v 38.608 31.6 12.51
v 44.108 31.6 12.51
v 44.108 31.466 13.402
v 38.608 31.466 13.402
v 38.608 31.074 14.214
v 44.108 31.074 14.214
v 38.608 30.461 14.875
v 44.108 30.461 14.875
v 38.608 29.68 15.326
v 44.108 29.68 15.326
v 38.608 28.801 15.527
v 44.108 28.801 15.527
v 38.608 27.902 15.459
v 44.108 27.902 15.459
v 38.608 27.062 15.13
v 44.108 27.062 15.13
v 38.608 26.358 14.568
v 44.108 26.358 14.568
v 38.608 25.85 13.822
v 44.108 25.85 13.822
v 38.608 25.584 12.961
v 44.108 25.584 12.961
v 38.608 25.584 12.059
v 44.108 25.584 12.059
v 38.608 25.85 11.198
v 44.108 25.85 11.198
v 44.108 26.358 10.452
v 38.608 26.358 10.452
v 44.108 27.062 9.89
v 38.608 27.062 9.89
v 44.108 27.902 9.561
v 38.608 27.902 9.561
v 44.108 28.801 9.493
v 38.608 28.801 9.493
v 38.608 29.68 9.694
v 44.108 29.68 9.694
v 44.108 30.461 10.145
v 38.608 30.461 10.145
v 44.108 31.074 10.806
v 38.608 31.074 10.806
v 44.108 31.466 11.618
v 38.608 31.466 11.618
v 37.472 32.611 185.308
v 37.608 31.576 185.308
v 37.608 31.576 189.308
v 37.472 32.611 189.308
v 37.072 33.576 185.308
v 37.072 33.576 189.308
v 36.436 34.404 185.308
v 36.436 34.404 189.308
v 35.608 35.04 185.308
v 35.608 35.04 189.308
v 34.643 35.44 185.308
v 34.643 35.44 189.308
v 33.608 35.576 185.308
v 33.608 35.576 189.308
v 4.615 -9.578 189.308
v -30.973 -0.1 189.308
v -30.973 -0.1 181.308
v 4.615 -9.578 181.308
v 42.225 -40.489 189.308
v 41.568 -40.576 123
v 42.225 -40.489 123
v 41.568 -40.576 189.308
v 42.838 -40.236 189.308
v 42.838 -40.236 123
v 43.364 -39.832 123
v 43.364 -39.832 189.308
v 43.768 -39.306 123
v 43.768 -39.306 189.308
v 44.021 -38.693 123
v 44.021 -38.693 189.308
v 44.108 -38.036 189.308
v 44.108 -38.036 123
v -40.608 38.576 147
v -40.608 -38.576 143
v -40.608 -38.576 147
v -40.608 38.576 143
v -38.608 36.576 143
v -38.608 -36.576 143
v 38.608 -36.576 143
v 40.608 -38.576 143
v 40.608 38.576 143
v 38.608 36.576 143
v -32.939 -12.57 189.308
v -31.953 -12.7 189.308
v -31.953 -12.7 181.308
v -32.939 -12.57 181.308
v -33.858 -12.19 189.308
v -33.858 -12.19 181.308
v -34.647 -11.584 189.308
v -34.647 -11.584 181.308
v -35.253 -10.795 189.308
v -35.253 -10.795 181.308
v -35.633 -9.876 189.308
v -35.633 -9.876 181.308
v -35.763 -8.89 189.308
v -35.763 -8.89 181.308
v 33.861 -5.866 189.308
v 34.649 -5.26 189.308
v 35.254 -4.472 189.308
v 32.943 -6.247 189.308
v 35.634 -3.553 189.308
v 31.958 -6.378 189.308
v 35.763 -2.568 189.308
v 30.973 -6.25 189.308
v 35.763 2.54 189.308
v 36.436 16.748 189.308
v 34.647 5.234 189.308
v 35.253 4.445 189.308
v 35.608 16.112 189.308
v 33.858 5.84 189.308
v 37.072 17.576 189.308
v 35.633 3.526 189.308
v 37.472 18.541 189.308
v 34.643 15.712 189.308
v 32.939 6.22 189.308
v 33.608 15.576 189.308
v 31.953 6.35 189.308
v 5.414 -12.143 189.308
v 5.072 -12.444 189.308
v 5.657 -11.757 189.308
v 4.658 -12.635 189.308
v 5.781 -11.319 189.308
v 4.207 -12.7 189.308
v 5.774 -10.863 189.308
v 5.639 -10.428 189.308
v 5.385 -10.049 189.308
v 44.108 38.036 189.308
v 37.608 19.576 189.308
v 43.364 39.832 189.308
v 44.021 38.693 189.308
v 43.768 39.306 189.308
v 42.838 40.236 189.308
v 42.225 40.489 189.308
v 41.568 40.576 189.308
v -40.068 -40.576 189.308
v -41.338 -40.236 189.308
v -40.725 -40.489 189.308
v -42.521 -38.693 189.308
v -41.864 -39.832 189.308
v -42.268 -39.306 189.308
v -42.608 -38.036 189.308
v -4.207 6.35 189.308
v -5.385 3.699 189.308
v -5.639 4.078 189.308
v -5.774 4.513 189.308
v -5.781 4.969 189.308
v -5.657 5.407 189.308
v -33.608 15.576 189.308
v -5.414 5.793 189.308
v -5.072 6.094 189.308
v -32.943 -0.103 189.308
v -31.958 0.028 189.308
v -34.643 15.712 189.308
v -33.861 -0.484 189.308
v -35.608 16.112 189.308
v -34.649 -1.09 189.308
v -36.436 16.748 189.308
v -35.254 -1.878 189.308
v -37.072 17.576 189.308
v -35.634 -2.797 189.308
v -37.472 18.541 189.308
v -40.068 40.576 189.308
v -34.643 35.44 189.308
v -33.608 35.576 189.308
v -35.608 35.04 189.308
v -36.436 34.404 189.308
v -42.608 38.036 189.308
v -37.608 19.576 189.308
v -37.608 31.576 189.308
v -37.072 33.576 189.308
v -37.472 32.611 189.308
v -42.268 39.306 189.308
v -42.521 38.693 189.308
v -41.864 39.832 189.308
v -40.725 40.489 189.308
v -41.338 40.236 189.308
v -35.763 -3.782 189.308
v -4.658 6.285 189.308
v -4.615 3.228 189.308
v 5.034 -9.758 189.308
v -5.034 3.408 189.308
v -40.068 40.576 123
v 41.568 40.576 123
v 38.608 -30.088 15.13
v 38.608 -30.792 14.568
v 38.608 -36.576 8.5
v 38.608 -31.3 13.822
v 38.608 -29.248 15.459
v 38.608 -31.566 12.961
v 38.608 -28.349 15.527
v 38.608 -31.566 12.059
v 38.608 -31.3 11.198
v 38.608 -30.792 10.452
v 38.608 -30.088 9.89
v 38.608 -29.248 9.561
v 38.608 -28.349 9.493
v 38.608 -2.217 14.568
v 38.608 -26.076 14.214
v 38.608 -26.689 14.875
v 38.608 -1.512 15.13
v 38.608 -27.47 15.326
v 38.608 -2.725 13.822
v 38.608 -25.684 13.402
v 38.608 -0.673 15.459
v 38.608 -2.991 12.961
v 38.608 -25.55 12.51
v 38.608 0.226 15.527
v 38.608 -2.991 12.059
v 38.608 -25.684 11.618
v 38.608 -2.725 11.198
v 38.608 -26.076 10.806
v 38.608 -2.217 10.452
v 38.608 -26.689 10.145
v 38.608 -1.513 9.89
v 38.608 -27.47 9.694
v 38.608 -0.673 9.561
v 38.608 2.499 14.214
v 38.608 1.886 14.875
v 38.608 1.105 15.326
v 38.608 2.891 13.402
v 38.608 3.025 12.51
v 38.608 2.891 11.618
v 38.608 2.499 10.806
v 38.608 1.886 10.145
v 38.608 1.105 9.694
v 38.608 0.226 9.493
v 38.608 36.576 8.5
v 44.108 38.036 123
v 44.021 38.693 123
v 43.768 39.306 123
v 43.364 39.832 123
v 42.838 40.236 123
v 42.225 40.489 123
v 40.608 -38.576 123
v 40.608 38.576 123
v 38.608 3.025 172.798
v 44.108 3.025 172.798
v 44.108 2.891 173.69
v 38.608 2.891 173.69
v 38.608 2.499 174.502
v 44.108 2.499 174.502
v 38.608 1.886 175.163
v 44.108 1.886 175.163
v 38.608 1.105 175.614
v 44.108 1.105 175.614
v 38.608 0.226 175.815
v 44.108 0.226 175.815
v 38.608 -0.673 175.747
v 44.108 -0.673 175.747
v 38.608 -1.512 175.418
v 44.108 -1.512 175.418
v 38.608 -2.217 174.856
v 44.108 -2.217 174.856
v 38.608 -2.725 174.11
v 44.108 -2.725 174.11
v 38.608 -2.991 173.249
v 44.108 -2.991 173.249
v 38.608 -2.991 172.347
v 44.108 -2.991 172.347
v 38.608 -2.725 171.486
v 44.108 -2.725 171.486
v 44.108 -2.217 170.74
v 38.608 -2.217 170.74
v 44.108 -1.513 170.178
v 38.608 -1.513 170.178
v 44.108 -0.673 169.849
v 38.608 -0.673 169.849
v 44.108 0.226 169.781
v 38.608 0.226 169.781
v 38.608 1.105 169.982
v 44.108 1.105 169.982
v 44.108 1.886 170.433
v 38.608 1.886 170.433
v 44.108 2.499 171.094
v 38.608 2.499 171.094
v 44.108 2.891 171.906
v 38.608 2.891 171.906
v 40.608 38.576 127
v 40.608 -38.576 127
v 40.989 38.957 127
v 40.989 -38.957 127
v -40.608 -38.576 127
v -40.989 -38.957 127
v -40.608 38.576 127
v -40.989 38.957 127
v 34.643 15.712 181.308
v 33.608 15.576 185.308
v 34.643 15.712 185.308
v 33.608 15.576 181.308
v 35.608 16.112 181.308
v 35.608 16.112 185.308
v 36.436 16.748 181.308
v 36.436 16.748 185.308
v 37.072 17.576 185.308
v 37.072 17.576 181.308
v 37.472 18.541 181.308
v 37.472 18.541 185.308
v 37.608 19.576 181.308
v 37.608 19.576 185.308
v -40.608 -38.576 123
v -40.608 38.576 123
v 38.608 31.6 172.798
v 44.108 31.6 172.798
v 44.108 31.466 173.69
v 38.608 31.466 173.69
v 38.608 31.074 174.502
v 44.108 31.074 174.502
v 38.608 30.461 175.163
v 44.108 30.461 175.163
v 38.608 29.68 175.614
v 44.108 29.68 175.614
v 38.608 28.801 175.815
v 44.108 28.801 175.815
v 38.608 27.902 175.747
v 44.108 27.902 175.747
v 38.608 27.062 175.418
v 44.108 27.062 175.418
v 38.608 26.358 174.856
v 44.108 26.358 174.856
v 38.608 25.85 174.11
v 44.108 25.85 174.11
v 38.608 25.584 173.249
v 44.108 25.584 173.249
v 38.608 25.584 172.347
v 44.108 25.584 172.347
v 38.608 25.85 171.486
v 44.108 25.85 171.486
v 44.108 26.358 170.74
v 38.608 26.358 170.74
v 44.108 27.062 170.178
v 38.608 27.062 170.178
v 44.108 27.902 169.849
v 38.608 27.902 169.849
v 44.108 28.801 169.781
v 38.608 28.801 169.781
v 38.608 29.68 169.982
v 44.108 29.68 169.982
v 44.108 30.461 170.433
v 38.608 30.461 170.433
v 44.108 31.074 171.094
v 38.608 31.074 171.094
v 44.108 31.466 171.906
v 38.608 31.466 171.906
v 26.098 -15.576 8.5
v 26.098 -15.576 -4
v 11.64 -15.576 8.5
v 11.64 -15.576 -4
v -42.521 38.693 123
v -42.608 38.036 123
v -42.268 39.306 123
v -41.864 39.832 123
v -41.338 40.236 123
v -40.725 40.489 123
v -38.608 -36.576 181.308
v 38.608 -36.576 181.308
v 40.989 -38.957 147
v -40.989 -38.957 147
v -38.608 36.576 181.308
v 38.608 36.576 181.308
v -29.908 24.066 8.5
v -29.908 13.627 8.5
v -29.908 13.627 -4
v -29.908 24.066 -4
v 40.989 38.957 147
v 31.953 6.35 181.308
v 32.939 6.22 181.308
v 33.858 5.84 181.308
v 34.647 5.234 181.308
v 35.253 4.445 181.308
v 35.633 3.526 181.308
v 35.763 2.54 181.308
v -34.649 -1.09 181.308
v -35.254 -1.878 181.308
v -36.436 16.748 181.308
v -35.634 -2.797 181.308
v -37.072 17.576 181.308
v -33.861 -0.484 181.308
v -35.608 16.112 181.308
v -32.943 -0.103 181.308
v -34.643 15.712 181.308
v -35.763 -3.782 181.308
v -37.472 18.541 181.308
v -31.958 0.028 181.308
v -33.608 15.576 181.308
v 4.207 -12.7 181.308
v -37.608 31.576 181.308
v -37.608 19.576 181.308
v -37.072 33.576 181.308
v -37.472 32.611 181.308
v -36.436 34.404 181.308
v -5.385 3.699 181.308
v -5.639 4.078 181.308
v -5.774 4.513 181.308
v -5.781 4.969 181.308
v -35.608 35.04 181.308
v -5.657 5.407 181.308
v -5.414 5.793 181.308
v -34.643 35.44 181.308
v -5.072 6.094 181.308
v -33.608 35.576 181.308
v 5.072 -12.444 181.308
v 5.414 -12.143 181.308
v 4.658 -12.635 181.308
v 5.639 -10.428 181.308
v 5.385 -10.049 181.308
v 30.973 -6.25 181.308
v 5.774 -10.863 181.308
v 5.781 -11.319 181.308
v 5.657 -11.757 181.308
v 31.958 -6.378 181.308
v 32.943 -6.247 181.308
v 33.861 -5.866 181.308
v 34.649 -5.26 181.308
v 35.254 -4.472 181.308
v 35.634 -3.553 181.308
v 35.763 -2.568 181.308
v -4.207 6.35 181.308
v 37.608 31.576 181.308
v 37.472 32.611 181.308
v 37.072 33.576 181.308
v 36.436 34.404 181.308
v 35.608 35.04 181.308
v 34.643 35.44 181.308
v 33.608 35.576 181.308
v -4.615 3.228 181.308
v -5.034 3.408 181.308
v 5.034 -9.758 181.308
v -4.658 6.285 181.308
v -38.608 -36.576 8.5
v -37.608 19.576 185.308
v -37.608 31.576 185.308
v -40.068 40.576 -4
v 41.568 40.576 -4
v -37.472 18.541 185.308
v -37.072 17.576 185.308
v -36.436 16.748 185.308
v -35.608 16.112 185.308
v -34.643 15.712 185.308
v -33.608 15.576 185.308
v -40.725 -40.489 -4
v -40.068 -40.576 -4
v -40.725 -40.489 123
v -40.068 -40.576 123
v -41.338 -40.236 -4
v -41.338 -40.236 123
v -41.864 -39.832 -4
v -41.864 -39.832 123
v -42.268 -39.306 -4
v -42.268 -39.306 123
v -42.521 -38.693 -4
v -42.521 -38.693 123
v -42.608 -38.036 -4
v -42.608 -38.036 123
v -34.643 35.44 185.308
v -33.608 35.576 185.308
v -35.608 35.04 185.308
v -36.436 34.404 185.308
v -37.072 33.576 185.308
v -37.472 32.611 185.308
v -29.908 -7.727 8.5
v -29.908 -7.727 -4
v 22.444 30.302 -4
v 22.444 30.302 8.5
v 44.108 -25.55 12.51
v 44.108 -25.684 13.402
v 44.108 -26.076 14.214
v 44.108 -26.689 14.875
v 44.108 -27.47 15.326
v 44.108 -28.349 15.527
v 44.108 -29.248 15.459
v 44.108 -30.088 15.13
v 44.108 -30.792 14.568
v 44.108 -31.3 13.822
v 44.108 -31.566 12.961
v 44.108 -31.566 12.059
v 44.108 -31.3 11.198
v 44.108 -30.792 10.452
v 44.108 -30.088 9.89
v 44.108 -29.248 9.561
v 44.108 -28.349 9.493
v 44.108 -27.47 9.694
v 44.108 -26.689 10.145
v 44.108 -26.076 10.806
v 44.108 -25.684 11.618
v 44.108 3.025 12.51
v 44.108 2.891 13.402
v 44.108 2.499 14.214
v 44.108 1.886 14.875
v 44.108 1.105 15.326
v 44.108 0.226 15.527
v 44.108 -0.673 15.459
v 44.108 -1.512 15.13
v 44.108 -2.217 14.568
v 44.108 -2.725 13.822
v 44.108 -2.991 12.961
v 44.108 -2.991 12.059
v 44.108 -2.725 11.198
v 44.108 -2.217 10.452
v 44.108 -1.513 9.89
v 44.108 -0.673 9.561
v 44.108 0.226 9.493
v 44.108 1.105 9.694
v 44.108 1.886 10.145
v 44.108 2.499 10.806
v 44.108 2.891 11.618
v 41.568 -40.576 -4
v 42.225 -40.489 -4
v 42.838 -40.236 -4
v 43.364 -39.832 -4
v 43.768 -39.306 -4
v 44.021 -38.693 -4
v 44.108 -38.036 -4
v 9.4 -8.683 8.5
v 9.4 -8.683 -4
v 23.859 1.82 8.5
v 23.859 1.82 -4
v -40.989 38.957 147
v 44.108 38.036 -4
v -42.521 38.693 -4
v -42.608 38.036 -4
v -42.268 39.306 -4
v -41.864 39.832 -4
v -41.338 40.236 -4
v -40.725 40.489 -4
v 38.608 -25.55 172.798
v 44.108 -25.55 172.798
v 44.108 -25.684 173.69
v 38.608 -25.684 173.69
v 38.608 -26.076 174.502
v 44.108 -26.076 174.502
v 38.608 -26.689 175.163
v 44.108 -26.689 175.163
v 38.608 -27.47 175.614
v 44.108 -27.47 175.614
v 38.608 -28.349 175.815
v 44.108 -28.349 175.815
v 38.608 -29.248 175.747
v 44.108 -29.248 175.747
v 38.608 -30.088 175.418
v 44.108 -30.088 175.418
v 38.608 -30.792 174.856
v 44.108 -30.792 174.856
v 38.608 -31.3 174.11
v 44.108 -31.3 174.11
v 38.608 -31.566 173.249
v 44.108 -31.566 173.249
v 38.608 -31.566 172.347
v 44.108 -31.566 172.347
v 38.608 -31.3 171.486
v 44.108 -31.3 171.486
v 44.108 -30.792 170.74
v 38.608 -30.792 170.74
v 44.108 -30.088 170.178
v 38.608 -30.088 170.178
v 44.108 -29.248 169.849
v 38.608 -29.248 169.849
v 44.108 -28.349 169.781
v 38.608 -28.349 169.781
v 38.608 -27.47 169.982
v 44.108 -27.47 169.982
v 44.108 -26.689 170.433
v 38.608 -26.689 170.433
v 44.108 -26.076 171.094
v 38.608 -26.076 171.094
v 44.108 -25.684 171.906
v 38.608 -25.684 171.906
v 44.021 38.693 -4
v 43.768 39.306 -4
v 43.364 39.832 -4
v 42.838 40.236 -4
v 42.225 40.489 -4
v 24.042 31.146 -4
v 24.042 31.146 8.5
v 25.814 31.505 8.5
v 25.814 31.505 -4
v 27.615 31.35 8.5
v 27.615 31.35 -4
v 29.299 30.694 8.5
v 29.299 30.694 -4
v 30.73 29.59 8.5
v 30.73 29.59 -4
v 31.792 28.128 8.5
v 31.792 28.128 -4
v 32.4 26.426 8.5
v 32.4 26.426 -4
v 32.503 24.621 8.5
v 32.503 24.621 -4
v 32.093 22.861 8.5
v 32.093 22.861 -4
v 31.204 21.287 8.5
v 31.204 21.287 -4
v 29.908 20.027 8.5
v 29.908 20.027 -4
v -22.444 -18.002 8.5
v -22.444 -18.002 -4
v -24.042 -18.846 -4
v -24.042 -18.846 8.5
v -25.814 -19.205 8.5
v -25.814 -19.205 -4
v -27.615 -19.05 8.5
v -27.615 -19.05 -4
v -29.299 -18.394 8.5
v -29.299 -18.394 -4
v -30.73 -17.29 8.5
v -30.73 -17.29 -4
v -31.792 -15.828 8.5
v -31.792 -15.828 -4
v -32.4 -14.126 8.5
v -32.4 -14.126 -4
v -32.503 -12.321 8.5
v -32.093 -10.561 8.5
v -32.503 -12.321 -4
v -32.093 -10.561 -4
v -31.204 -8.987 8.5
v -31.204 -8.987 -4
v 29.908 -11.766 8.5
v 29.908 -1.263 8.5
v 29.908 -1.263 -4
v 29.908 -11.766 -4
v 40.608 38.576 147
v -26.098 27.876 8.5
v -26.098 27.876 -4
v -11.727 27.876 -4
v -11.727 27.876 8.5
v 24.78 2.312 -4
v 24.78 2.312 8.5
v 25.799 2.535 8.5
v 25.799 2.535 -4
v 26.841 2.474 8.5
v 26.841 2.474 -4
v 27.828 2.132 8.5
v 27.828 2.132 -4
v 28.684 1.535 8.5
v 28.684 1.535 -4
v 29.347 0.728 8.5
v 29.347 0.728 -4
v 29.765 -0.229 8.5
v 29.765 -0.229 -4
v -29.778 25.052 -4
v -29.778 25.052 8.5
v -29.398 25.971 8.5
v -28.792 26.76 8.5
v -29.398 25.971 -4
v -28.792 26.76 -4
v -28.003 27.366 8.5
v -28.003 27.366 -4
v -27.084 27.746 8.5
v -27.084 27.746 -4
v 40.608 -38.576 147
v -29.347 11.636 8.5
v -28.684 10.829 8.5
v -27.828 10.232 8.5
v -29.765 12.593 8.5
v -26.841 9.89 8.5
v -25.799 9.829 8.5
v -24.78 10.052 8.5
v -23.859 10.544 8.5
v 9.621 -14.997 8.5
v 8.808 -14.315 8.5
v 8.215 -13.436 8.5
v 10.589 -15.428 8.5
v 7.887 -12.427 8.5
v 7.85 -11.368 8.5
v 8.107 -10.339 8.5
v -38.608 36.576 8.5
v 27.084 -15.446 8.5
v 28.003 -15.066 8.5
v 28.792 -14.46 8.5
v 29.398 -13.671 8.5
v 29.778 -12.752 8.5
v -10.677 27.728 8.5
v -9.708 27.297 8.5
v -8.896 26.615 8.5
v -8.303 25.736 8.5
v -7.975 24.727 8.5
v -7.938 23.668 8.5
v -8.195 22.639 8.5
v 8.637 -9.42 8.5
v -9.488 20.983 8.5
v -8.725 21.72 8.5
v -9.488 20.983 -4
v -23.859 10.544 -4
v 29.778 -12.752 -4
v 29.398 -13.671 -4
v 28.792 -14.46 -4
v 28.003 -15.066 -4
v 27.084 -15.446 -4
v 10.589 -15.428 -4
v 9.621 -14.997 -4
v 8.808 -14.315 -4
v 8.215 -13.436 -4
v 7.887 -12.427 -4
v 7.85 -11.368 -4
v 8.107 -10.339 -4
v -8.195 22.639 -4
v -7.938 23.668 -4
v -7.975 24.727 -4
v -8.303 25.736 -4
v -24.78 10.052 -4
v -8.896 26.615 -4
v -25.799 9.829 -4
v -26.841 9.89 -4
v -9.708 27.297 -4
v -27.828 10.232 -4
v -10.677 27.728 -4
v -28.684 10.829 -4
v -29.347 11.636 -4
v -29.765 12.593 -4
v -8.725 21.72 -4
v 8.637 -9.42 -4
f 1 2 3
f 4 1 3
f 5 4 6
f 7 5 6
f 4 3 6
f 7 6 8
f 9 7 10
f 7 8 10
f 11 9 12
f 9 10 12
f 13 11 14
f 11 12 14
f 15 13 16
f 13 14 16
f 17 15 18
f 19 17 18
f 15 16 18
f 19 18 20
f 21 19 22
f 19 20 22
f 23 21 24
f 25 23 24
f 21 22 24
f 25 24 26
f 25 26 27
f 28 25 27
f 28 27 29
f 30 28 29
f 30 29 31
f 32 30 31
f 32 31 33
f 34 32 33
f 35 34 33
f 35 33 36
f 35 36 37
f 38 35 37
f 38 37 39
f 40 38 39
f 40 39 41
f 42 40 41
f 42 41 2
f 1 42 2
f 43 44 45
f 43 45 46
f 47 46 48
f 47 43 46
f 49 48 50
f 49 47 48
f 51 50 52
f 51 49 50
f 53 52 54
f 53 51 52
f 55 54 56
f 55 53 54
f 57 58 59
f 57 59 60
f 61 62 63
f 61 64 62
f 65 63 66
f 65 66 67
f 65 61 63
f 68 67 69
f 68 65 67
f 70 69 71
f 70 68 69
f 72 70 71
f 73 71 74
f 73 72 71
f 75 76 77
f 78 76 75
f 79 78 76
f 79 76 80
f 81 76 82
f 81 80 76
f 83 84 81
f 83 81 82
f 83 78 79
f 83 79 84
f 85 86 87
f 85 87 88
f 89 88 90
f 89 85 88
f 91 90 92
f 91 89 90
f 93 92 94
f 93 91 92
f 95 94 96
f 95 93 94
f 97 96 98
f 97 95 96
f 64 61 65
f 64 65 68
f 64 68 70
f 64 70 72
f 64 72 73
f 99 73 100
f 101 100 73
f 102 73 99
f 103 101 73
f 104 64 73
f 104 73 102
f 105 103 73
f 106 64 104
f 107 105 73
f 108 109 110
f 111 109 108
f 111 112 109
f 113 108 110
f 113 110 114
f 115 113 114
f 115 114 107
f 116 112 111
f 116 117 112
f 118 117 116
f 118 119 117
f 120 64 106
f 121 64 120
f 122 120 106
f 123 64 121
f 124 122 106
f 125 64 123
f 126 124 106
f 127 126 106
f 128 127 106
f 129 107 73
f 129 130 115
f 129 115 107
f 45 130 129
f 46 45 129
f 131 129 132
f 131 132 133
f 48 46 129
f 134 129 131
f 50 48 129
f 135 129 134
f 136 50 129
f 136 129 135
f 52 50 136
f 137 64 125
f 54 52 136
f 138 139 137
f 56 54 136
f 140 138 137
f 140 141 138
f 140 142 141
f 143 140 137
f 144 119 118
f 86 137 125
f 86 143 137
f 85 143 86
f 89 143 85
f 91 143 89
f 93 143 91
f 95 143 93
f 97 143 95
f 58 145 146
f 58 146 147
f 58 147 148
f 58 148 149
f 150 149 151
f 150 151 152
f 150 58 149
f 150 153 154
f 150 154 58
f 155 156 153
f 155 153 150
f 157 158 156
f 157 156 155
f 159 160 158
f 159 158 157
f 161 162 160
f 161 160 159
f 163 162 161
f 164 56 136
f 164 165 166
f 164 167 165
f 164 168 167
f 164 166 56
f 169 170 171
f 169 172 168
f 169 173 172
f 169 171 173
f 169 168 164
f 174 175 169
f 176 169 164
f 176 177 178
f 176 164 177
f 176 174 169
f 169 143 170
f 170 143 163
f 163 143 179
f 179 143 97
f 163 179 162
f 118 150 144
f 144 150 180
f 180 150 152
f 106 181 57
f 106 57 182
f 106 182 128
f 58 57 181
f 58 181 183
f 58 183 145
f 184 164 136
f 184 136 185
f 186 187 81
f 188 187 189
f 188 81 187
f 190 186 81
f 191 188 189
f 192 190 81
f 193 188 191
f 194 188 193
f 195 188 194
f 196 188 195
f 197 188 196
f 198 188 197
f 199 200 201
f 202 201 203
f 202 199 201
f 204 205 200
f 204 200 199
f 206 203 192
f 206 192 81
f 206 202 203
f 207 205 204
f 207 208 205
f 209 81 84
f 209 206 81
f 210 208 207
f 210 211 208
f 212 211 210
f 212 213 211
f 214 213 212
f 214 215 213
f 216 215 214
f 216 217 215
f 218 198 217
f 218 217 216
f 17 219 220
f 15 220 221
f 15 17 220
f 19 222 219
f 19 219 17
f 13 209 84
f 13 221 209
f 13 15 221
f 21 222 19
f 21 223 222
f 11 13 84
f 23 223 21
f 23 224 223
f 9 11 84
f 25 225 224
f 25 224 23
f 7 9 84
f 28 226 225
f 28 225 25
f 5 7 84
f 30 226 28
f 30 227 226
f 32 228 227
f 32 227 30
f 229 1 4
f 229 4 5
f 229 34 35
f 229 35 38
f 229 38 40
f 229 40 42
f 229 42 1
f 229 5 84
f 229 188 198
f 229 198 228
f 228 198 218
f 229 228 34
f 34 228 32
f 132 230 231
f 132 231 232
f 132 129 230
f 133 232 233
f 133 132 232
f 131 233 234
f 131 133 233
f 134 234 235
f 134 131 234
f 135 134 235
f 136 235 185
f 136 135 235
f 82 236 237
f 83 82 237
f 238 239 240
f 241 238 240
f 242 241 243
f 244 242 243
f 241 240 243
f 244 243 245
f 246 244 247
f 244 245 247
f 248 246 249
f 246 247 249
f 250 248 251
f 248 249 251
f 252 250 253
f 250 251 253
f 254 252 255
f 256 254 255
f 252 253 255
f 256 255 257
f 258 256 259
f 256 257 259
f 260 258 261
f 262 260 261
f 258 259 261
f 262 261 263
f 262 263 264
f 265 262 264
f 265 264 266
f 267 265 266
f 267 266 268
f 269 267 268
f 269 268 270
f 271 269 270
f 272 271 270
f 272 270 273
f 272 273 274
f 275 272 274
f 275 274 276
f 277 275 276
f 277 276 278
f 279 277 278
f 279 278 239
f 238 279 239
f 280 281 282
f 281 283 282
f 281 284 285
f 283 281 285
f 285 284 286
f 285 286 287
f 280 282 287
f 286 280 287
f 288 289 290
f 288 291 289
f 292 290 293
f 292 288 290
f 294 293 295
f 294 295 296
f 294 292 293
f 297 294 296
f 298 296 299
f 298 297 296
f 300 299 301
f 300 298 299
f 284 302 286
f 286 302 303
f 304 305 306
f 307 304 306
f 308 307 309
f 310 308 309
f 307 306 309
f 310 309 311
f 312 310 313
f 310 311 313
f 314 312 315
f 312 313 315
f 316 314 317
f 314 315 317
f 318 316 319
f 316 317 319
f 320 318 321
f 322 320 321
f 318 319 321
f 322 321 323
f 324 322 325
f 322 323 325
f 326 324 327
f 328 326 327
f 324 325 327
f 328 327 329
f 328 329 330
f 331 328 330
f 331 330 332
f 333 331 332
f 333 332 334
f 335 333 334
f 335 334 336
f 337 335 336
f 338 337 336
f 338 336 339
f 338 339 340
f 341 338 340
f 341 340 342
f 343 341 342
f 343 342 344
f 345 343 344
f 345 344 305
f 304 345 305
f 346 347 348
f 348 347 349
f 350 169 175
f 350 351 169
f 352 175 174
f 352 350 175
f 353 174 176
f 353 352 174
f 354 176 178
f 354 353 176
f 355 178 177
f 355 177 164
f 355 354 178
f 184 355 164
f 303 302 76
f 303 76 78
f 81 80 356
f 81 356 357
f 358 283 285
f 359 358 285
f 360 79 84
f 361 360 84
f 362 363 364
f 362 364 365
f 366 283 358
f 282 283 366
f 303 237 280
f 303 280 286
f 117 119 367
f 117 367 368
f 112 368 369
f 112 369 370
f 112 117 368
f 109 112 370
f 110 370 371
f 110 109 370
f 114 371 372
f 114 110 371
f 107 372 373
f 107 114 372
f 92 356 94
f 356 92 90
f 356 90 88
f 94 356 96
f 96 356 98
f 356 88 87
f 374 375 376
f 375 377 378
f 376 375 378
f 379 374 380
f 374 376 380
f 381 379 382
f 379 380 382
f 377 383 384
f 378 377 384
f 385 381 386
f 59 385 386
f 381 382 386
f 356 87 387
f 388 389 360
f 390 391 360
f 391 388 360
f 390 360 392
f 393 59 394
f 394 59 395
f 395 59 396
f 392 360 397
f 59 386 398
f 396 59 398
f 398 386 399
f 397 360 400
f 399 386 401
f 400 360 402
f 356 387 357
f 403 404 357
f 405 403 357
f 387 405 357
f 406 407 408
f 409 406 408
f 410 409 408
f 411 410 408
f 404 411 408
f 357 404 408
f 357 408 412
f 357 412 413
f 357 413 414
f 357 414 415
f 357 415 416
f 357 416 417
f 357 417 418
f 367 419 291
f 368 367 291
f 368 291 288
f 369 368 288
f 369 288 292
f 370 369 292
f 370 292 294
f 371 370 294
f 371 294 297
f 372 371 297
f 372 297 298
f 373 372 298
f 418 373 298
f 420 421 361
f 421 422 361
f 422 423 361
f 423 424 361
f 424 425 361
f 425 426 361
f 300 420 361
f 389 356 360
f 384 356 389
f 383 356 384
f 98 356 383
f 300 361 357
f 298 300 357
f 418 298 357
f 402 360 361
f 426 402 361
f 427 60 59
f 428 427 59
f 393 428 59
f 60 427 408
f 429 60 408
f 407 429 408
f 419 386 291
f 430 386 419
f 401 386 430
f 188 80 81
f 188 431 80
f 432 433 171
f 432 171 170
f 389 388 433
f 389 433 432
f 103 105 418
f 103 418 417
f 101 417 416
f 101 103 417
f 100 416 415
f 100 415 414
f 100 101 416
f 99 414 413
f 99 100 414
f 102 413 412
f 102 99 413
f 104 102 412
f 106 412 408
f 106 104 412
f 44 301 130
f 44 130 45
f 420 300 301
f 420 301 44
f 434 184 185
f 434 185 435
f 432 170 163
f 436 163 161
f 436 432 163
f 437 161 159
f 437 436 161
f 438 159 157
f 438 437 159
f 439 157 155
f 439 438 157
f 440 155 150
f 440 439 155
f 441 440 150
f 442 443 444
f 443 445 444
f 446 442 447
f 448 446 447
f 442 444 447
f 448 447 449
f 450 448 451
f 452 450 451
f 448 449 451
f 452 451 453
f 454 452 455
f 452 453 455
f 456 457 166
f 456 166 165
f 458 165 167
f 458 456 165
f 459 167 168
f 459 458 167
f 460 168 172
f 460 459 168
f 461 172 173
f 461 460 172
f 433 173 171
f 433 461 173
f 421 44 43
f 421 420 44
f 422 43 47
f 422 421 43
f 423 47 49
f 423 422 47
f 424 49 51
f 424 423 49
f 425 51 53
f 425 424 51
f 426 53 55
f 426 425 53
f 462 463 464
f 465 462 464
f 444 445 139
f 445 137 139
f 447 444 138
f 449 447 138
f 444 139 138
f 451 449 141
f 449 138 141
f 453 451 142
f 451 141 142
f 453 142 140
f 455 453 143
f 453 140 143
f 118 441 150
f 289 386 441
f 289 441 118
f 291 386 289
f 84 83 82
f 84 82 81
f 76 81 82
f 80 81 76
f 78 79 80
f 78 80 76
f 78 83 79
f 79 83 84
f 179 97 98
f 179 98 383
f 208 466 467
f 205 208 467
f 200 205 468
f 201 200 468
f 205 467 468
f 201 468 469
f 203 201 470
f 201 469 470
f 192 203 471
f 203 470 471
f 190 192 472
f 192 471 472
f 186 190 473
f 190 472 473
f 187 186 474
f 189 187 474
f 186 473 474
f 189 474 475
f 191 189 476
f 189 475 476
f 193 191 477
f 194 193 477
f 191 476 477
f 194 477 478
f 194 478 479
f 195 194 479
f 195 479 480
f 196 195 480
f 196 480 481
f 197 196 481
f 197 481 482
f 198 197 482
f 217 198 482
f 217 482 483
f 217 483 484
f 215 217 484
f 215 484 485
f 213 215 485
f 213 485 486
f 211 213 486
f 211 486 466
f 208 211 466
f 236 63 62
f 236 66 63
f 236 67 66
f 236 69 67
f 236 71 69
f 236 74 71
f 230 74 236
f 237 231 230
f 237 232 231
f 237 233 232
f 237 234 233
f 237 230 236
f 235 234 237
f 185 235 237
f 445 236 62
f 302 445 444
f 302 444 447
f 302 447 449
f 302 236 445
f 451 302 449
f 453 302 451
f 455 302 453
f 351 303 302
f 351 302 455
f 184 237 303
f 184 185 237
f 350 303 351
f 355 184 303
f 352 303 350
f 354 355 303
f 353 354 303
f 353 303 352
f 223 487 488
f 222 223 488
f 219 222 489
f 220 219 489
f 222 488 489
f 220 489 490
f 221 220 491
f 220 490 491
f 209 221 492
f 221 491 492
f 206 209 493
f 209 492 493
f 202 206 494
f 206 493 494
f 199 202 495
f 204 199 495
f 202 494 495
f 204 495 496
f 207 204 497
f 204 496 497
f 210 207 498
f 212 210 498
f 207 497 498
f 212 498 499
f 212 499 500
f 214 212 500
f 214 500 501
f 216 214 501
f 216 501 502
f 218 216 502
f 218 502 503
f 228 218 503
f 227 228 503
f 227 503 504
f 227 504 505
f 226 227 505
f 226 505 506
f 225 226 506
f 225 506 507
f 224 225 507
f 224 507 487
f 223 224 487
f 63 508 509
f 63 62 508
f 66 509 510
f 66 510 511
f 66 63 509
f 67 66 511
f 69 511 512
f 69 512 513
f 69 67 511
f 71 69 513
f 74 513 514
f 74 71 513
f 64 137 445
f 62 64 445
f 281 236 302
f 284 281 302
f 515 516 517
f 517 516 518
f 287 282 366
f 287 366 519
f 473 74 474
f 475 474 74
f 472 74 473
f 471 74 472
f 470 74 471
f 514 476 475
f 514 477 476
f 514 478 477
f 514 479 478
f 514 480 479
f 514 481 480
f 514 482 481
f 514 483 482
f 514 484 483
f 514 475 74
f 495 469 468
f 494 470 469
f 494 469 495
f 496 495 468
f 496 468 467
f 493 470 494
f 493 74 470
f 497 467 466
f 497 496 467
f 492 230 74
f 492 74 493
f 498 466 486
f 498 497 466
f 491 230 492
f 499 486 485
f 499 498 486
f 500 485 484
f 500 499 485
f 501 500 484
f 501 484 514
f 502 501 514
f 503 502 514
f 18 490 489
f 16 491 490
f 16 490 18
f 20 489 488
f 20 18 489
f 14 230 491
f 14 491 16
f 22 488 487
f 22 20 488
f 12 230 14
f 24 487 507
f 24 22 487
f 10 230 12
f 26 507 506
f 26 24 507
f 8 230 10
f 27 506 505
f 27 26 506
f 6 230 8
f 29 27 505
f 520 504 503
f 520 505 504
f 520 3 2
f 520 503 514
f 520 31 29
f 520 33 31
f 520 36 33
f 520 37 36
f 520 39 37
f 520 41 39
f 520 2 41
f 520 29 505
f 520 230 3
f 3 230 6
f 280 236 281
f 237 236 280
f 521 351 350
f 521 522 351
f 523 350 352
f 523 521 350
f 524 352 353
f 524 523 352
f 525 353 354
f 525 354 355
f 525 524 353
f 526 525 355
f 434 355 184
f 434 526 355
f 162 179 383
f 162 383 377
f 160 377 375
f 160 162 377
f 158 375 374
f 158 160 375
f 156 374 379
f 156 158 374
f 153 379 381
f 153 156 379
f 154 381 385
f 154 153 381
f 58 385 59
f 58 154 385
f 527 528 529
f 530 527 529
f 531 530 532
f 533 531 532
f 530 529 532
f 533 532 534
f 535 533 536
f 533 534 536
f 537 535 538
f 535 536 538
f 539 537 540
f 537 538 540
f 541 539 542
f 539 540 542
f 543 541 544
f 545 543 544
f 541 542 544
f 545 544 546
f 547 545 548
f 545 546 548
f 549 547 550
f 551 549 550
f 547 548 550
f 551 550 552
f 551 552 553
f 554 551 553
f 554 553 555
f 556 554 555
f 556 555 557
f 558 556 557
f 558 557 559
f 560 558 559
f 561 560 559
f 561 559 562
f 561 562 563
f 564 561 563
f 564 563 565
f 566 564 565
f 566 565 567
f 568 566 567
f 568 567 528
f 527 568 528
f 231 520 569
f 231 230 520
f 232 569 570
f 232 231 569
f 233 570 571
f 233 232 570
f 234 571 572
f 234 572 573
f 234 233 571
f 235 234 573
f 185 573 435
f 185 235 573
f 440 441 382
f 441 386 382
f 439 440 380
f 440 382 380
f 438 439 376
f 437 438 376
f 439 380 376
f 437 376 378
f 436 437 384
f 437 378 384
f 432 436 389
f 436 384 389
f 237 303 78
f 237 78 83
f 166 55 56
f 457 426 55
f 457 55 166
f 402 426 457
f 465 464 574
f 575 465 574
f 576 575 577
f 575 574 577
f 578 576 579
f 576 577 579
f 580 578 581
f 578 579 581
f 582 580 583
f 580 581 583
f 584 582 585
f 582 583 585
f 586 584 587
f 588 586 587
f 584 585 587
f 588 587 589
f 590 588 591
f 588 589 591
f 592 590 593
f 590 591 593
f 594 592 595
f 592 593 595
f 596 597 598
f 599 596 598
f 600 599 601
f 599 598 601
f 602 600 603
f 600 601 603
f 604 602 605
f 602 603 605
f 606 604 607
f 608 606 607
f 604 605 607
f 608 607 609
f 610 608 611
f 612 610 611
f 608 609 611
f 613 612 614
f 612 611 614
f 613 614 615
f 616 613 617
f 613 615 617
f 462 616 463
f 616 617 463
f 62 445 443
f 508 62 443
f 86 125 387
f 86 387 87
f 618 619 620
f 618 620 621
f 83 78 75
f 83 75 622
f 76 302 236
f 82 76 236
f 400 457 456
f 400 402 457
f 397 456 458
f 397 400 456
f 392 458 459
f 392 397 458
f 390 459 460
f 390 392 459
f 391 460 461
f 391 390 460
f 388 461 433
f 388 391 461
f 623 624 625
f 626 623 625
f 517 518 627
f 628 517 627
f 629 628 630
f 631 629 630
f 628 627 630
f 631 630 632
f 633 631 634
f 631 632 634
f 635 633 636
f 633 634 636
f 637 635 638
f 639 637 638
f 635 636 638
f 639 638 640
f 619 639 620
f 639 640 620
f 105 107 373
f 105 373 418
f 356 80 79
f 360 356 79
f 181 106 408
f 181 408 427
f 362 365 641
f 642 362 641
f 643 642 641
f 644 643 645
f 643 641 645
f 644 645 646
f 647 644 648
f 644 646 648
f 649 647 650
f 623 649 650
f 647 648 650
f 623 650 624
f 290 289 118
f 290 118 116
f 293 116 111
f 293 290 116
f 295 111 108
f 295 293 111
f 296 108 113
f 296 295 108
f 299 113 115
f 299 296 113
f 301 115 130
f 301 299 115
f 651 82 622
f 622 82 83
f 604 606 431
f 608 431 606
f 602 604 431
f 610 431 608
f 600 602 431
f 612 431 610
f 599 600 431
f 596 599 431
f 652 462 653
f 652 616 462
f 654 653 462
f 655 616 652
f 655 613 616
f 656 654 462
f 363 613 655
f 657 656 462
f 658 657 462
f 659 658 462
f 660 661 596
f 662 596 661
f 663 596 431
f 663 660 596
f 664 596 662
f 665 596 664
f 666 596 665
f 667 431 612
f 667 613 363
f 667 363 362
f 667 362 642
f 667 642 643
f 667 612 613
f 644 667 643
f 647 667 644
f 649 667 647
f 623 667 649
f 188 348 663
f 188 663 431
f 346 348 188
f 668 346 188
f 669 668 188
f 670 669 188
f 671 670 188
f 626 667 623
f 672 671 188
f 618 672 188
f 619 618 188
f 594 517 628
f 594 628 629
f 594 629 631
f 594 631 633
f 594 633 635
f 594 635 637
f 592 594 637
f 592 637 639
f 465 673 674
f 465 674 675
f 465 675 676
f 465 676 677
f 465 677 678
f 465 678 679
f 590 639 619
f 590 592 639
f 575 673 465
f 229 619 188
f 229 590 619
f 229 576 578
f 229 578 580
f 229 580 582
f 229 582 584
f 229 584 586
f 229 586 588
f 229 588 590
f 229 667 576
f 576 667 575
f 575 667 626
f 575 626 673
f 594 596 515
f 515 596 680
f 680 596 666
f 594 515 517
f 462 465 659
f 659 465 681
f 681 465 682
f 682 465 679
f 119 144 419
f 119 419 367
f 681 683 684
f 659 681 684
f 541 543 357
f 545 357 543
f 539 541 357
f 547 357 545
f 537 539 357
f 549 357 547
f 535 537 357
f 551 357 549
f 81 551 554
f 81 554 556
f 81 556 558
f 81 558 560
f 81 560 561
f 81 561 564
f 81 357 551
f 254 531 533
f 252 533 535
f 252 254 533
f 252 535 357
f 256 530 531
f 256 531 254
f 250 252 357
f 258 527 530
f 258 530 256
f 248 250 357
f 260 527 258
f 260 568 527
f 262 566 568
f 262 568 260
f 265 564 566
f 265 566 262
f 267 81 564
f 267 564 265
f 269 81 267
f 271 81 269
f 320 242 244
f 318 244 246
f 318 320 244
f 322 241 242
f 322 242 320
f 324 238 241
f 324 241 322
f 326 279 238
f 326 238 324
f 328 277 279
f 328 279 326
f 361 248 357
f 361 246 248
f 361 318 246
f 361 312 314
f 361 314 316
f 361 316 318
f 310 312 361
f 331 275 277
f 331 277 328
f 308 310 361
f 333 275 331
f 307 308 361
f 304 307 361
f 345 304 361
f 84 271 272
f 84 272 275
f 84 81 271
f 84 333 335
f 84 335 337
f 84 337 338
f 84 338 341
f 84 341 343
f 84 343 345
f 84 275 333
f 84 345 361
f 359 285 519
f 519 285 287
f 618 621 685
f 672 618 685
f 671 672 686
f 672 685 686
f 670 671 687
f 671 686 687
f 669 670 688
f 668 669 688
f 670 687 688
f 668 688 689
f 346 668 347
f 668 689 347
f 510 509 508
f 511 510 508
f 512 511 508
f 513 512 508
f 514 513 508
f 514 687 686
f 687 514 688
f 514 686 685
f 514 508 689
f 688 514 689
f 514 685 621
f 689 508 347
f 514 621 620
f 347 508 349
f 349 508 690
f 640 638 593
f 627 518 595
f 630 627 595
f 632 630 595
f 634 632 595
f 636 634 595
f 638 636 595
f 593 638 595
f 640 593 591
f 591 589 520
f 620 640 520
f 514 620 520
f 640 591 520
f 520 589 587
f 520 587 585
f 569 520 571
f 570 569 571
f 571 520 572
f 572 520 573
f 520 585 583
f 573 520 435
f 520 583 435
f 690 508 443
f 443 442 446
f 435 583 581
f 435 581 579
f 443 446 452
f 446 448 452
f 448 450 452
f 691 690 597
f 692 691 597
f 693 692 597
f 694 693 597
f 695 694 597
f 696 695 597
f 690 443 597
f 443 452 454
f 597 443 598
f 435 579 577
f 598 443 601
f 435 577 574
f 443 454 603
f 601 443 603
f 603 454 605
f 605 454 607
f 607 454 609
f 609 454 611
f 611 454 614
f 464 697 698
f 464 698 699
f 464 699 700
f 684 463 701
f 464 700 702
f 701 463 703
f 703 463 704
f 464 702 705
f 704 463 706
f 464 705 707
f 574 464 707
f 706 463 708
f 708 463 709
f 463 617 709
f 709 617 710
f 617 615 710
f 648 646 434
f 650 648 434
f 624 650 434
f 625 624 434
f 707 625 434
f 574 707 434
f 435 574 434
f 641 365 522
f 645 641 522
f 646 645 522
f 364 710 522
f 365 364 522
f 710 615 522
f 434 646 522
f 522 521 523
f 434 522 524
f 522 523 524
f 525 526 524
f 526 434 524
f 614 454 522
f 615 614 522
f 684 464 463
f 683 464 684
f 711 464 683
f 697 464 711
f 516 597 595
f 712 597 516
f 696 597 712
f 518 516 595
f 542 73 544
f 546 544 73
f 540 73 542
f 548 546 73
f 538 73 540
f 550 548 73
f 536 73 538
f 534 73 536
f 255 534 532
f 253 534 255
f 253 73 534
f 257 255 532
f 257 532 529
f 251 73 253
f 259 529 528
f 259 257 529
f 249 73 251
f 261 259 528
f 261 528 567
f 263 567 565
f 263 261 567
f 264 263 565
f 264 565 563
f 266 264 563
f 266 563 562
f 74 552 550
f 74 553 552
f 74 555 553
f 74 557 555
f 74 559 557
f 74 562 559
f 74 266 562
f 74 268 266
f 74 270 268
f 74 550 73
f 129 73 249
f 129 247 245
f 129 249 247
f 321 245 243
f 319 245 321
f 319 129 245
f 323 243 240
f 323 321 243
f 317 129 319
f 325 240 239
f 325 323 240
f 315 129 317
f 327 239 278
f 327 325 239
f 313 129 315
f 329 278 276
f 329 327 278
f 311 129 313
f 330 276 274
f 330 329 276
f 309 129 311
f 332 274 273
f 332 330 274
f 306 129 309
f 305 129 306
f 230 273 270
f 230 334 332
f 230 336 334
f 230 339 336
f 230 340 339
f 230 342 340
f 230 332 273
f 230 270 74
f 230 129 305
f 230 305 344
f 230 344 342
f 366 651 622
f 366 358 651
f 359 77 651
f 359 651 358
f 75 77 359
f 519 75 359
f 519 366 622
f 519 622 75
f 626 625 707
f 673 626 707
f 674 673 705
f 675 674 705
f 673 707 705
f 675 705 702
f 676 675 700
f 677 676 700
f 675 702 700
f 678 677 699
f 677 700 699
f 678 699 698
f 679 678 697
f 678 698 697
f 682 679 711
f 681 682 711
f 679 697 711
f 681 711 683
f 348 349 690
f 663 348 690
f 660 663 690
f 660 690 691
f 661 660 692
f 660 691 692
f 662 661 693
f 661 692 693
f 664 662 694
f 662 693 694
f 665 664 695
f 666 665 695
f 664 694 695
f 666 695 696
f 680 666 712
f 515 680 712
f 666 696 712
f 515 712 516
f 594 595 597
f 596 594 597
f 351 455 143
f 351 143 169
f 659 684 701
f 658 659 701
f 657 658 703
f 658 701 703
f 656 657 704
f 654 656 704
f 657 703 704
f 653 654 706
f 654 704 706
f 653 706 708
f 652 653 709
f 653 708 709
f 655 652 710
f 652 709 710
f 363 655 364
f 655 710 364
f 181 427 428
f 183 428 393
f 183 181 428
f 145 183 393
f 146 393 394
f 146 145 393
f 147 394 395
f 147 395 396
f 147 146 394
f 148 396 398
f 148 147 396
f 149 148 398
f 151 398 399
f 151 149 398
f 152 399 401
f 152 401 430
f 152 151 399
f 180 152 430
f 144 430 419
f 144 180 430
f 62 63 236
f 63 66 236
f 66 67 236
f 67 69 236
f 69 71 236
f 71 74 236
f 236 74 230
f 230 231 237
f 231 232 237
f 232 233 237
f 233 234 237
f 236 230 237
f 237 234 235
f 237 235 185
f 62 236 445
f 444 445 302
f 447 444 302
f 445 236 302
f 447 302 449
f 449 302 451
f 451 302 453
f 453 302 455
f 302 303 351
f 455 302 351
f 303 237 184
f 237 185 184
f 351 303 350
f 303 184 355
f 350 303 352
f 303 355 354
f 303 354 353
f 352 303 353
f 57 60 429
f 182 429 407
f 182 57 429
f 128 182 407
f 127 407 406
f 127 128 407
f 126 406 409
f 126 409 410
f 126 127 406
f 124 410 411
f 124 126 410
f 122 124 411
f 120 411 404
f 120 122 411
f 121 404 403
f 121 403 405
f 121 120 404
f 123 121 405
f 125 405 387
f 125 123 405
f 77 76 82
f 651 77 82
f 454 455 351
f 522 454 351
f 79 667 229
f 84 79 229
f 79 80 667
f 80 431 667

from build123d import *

# Parameters (mm, degrees)
SKETCH1_W            = 85.216
SKETCH1_H            = 81.152
BOSS_EXTRUDE1_DEPTH  = 185.308
SHELL2_T             = -4
SHELL3_T             = -4
SKETCH4_W            = 81.216
SKETCH4_H            = 77.152
SKETCH4_W_2          = 77.216
SKETCH4_H_2          = 73.152
BOSS_EXTRUDE2_DEPTH  = 20
SKETCH5_W            = 81.978
SKETCH5_H            = 77.914
SKETCH5_W_2          = 77.216
SKETCH5_H_2          = 73.152
CUT_EXTRUDE2_DEPTH   = 20
SKETCH6_W            = 75.216
SKETCH6_H            = 20
CUT_EXTRUDE3_DEPTH   = 4
FILLET3_R            = 4
SKETCH7_W            = 85.216
SKETCH7_H            = 81.152
BOSS_EXTRUDE3_DEPTH  = 4
SKETCH8_W            = 85.216
SKETCH8_H            = 81.152
BOSS_EXTRUDE4_DEPTH  = 4
SKETCH9_R            = 3.025
CUT_EXTRUDE4_DEPTH   = 6
SKETCH10_W           = 77.216
SKETCH10_H           = 73.152
BOSS_EXTRUDE5_DEPTH  = 4.500000096
CUT_EXTRUDE5_DEPTH   = 12.500000096
CUT_EXTRUDE6_DEPTH   = 8
SKETCH13_W           = 62.308
SKETCH13_H           = 81.152
BOSS_EXTRUDE7_DEPTH  = 1.5
SKETCH15_W           = 131
SKETCH15_H           = 81.152
BOSS_EXTRUDE8_DEPTH  = 1.5
FILLET4_R            = 2.54
FILLET5_R            = 2.54
SKETCH16_R           = 3.025
CUT_EXTRUDE9_DEPTH   = 19.5
SKETCH18_W           = 62.209478129
SKETCH18_H           = 16.943734599
BOSS_EXTRUDE9_DEPTH  = 8
SKETCH19_W           = 60.72535539
SKETCH19_H           = 14.841227386
BOSS_EXTRUDE10_DEPTH = 12.5
SKETCH20_W           = 81.216
SKETCH20_H           = 77.152
SKETCH20_W_2         = 77.216
SKETCH20_H_2         = 73.152
BOSS_EXTRUDE11_DEPTH = 20
SKETCH21_W           = 81.216
SKETCH21_H           = 77.152
CUT_EXTRUDE10_DEPTH  = 20


with BuildPart() as part:
    # Sketch1 → Boss-Extrude1 (new body)
    with BuildSketch(Plane.XY):
        Rectangle(SKETCH1_W, SKETCH1_H)
    extrude(amount=BOSS_EXTRUDE1_DEPTH)


with BuildPart() as body_2:
    # Split1: the piece on the far side of the plane
    add(part.part)
    split(bisect_by=Plane(origin=(0, 0, 127), x_dir=(-1, 0, 0), z_dir=(0, 0, -1)), keep=Keep.BOTTOM)

    # Shell3
    shell3_openings = [body_2.faces().sort_by_distance(p)[0] for p in [
        (0, 0, 127),
    ]]
    offset(amount=SHELL3_T, openings=shell3_openings, kind=Kind.INTERSECTION)

    # Sketch5 → Cut-Extrude2 (cut)
    with BuildSketch(Plane(origin=(0, 0, 127), x_dir=(-1, 0, 0), z_dir=(0, 0, -1))):
        Rectangle(SKETCH5_W, SKETCH5_H)
        Rectangle(SKETCH5_W_2, SKETCH5_H_2, mode=Mode.SUBTRACT)
    extrude(amount=-CUT_EXTRUDE2_DEPTH, mode=Mode.SUBTRACT)

    # Sketch6 → Cut-Extrude3 (cut)
    with BuildSketch(Plane.XY.offset(185.308)):
        with Locations((0, 25.576)):
            Rectangle(SKETCH6_W, SKETCH6_H)
    extrude(amount=-CUT_EXTRUDE3_DEPTH, mode=Mode.SUBTRACT)

    # Fillet3
    fillet3_edges = [body_2.edges().sort_by_distance(p)[0] for p in [
        (37.608, 35.576, 183.308),
        (37.608, 15.576, 183.308),
        (-37.608, 15.576, 183.308),
        (-37.608, 35.576, 183.308),
    ]]
    fillet(fillet3_edges, radius=FILLET3_R)

    # Sketch7 → Boss-Extrude3 (add)
    with BuildSketch(Plane.XY.offset(185.308)):
        Rectangle(SKETCH7_W, SKETCH7_H)
        with BuildLine():
            Line((-33.608, 15.576), (33.608, 15.576))
            ThreePointArc((33.608, 15.576), (36.436427125, 16.747572875), (37.608, 19.576))
            Line((37.608, 19.576), (37.608, 31.576))
            ThreePointArc((37.608, 31.576), (36.436427125, 34.404427125), (33.608, 35.576))
            Line((33.608, 35.576), (-33.608, 35.576))
            ThreePointArc((-33.608, 35.576), (-36.436427125, 34.404427125), (-37.608, 31.576))
            Line((-37.608, 31.576), (-37.608, 19.576))
            ThreePointArc((-37.608, 19.576), (-36.436427125, 16.747572875), (-33.608, 15.576))
        make_face(mode=Mode.SUBTRACT)
    extrude(amount=BOSS_EXTRUDE3_DEPTH)

    # Sketch9 → Cut-Extrude4 (cut)
    with BuildSketch(Plane.XY.offset(189.308)):
        with Locations((-21.304, -27.876)):
            Circle(SKETCH9_R)
        with Locations((0, -27.876)):
            Circle(SKETCH9_R)
        with Locations((21.304, -27.876)):
            Circle(SKETCH9_R)
    cut_extrude4 = extrude(amount=-CUT_EXTRUDE4_DEPTH, mode=Mode.SUBTRACT)

    # Sketch12 → Cut-Extrude6 (cut)
    with BuildSketch(Plane.XY.offset(189.308)):
        with BuildLine():
            Line((-30.972571902, -0.100195505), (4.615140384, -9.578475727))
            ThreePointArc((4.615140384, -9.578475727), (5.780649168, -11.318525139), (4.206574871, -12.7))
            Line((4.206574871, -12.7), (-31.953129133, -12.7))
            ThreePointArc((-31.953129133, -12.7), (-34.64720597, -11.584076836), (-35.763129133, -8.89))
            Line((-35.763129133, -8.89), (-35.763129133, -3.781853761))
            ThreePointArc((-35.763129133, -3.781853761), (-34.274785541, -0.760924844), (-30.972571902, -0.100195505))
        make_face()
        with BuildLine():
            Line((-4.206574871, 6.35), (31.953129133, 6.35))
            ThreePointArc((31.953129133, 6.35), (34.64720597, 5.234076836), (35.763129133, 2.54))
            Line((35.763129133, 2.54), (35.763129133, -2.568146239))
            ThreePointArc((35.763129133, -2.568146239), (34.274785541, -5.589075156), (30.972571902, -6.249804495))
            Line((30.972571902, -6.249804495), (-4.615140384, 3.228475727))
            ThreePointArc((-4.615140384, 3.228475727), (-5.780649168, 4.968525139), (-4.206574871, 6.35))
        make_face()
    extrude(amount=-CUT_EXTRUDE6_DEPTH, mode=Mode.SUBTRACT)


with BuildPart() as part_1:
    add(part.part)

    # Split1
    split(bisect_by=Plane(origin=(0, 0, 127), x_dir=(-1, 0, 0), z_dir=(0, 0, -1)), keep=Keep.TOP)

    # Shell2
    shell2_openings = [part_1.faces().sort_by_distance(p)[0] for p in [
        (0, 0, 127),
    ]]
    offset(amount=SHELL2_T, openings=shell2_openings, kind=Kind.INTERSECTION)

    # Sketch4 → Boss-Extrude2 (add)
    with BuildSketch(Plane.XY.offset(127)):
        Rectangle(SKETCH4_W, SKETCH4_H)
        Rectangle(SKETCH4_W_2, SKETCH4_H_2, mode=Mode.SUBTRACT)
    extrude(amount=BOSS_EXTRUDE2_DEPTH)

    # Sketch8 → Boss-Extrude4 (add)
    with BuildSketch(Plane(origin=(0, 0, 0), x_dir=(-1, 0, 0), z_dir=(0, 0, -1))):
        Rectangle(SKETCH8_W, SKETCH8_H)
    extrude(amount=BOSS_EXTRUDE4_DEPTH)

    # Mirror1: Cut-Extrude4 across plane
    add(cut_extrude4.mirror(Plane.XY.offset(92.654)), mode=Mode.SUBTRACT)

    # Sketch10 → Boss-Extrude5 (add)
    with BuildSketch(Plane.XY.offset(4)):
        Rectangle(SKETCH10_W, SKETCH10_H)
    extrude(amount=BOSS_EXTRUDE5_DEPTH)

    # Sketch11 → Cut-Extrude5 (cut)
    with BuildSketch(Plane(origin=(0, 0, -4), x_dir=(-1, 0, 0), z_dir=(0, 0, -1))):
        with BuildLine():
            ThreePointArc((29.908, 24.066), (28.792076836, 26.760076836), (26.098, 27.876))
            Line((26.098, 27.876), (11.727473696, 27.876))
            ThreePointArc((11.727473696, 27.876), (8.103904131, 25.243218589), (9.488243538, 20.983476959))
            Line((9.488243538, 20.983476959), (23.858769841, 10.544328421))
            ThreePointArc((23.858769841, 10.544328421), (27.827831364, 10.232181603), (29.908, 13.626851462))
            Line((29.908, 13.626851462), (29.908, 24.066))
        make_face()
        with BuildLine():
            ThreePointArc((-23.858769841, 1.819526927), (-27.827831364, 2.131673746), (-29.908, -1.262996113))
            Line((-29.908, -1.262996113), (-29.908, -11.766))
            ThreePointArc((-29.908, -11.766), (-28.792076836, -14.460076836), (-26.098, -15.576))
            Line((-26.098, -15.576), (-11.639570458, -15.576))
            ThreePointArc((-11.639570458, -15.576), (-8.016000893, -12.943218589), (-9.400340299, -8.683476959))
            Line((-9.400340299, -8.683476959), (-23.858769841, 1.819526927))
        make_face()
        with BuildLine():
            ThreePointArc((22.443899471, -18.002473668), (31.313488137, -16.596985531), (29.908, -7.727396865))
            Line((29.908, -7.727396865), (-22.443899471, 30.302473668))
            ThreePointArc((-22.443899471, 30.302473668), (-31.313488137, 28.896985531), (-29.908, 20.027396865))
            Line((-29.908, 20.027396865), (22.443899471, -18.002473668))
        make_face()
    extrude(amount=-CUT_EXTRUDE5_DEPTH, mode=Mode.SUBTRACT)

    add(body_2.part)  # Boss-Extrude7 merges body 2
    # Sketch13 → Boss-Extrude7 (add)
    with BuildSketch(Plane.ZY.offset(-42.608)):
        with Locations((158.154, 0)):
            Rectangle(SKETCH13_W, SKETCH13_H)
    extrude(amount=-BOSS_EXTRUDE7_DEPTH)

    # Sketch15 → Boss-Extrude8 (add)
    with BuildSketch(Plane(origin=(42.608, 0, 0), x_dir=(0, 0, -1), z_dir=(1, 0, 0))):
        with Locations((-61.5, 0)):
            Rectangle(SKETCH15_W, SKETCH15_H)
    extrude(amount=BOSS_EXTRUDE8_DEPTH)


with BuildPart() as body_2_2:
    # Split2: the piece on the far side of the plane
    add(part_1.part)
    split(bisect_by=Plane(origin=(0, 0, 123), x_dir=(-1, 0, 0), z_dir=(0, 0, -1)), keep=Keep.BOTTOM)

    # Fillet4
    fillet4_edges = [body_2_2.edges().sort_by_distance(p)[0] for p in [
        (44.108, -40.576, 156.154),
        (44.108, 40.576, 156.154),
        (-42.608, 40.576, 156.154),
        (-42.608, -40.576, 156.154),
    ]]
    fillet(fillet4_edges, radius=FILLET4_R)


with BuildPart() as part_2:
    add(part_1.part)

    # Split2
    split(bisect_by=Plane(origin=(0, 0, 123), x_dir=(-1, 0, 0), z_dir=(0, 0, -1)), keep=Keep.TOP)

    # Fillet5
    fillet5_edges = [part_2.edges().sort_by_distance(p)[0] for p in [
        (44.108, -40.576, 59.5),
        (44.108, 40.576, 59.5),
        (-42.608, 40.576, 59.5),
        (-42.608, -40.576, 59.5),
    ]]
    fillet(fillet5_edges, radius=FILLET5_R)


with BuildPart() as cut_extrude9_tool:
    # Sketch16 → Cut-Extrude9 (new body)
    with BuildSketch(Plane(origin=(44.108, 0, 0), x_dir=(0, 0, -1), z_dir=(1, 0, 0))):
        with Locations(Location((-172.798, 28.575, 0), (0, 0, 90))):
            Circle(SKETCH16_R)
        with Locations(Location((-172.798, 0, 0), (0, 0, 90))):
            Circle(SKETCH16_R)
        with Locations(Location((-172.798, -28.575, 0), (0, 0, 90))):
            Circle(SKETCH16_R)
        with Locations(Location((-12.51, 28.575, 0), (0, 0, 90))):
            Circle(SKETCH16_R)
        with Locations(Location((-12.51, 0, 0), (0, 0, 90))):
            Circle(SKETCH16_R)
        with Locations(Location((-12.51, -28.575, 0), (0, 0, 90))):
            Circle(SKETCH16_R)
    extrude(amount=-CUT_EXTRUDE9_DEPTH)


with BuildPart() as part_3:
    add(part_2.part)

    # Cut-Extrude9: cut by cut_extrude9_tool
    add(cut_extrude9_tool.part, mode=Mode.SUBTRACT)

    # Sketch19 → Boss-Extrude10 (add)
    with BuildSketch(Plane(origin=(0, 0, -4), x_dir=(-1, 0, 0), z_dir=(0, 0, -1))):
        with Locations((-1.053899817, -28.260170482)):
            Rectangle(SKETCH19_W, SKETCH19_H)
    extrude(amount=-BOSS_EXTRUDE10_DEPTH)

    # Sketch20 → Boss-Extrude11 (add)
    with BuildSketch(Plane.XY.offset(123)):
        Rectangle(SKETCH20_W, SKETCH20_H)
        Rectangle(SKETCH20_W_2, SKETCH20_H_2, mode=Mode.SUBTRACT)
    extrude(amount=BOSS_EXTRUDE11_DEPTH)


with BuildPart() as body_2_2_1:
    add(body_2_2.part)

    # Cut-Extrude9: cut by cut_extrude9_tool
    add(cut_extrude9_tool.part, mode=Mode.SUBTRACT)

    # Sketch18 → Boss-Extrude9 (add)
    with BuildSketch(Plane.XY.offset(189.308)):
        with Locations((0.188161552, -26.961563086)):
            Rectangle(SKETCH18_W, SKETCH18_H)
    extrude(amount=-BOSS_EXTRUDE9_DEPTH)

    # Sketch21 → Cut-Extrude10 (cut)
    with BuildSketch(Plane(origin=(0, 0, 123), x_dir=(-1, 0, 0), z_dir=(0, 0, -1))):
        Rectangle(SKETCH21_W, SKETCH21_H)
    extrude(amount=-CUT_EXTRUDE10_DEPTH, mode=Mode.SUBTRACT)


solid = Compound([part_3.part, body_2_2_1.part])
